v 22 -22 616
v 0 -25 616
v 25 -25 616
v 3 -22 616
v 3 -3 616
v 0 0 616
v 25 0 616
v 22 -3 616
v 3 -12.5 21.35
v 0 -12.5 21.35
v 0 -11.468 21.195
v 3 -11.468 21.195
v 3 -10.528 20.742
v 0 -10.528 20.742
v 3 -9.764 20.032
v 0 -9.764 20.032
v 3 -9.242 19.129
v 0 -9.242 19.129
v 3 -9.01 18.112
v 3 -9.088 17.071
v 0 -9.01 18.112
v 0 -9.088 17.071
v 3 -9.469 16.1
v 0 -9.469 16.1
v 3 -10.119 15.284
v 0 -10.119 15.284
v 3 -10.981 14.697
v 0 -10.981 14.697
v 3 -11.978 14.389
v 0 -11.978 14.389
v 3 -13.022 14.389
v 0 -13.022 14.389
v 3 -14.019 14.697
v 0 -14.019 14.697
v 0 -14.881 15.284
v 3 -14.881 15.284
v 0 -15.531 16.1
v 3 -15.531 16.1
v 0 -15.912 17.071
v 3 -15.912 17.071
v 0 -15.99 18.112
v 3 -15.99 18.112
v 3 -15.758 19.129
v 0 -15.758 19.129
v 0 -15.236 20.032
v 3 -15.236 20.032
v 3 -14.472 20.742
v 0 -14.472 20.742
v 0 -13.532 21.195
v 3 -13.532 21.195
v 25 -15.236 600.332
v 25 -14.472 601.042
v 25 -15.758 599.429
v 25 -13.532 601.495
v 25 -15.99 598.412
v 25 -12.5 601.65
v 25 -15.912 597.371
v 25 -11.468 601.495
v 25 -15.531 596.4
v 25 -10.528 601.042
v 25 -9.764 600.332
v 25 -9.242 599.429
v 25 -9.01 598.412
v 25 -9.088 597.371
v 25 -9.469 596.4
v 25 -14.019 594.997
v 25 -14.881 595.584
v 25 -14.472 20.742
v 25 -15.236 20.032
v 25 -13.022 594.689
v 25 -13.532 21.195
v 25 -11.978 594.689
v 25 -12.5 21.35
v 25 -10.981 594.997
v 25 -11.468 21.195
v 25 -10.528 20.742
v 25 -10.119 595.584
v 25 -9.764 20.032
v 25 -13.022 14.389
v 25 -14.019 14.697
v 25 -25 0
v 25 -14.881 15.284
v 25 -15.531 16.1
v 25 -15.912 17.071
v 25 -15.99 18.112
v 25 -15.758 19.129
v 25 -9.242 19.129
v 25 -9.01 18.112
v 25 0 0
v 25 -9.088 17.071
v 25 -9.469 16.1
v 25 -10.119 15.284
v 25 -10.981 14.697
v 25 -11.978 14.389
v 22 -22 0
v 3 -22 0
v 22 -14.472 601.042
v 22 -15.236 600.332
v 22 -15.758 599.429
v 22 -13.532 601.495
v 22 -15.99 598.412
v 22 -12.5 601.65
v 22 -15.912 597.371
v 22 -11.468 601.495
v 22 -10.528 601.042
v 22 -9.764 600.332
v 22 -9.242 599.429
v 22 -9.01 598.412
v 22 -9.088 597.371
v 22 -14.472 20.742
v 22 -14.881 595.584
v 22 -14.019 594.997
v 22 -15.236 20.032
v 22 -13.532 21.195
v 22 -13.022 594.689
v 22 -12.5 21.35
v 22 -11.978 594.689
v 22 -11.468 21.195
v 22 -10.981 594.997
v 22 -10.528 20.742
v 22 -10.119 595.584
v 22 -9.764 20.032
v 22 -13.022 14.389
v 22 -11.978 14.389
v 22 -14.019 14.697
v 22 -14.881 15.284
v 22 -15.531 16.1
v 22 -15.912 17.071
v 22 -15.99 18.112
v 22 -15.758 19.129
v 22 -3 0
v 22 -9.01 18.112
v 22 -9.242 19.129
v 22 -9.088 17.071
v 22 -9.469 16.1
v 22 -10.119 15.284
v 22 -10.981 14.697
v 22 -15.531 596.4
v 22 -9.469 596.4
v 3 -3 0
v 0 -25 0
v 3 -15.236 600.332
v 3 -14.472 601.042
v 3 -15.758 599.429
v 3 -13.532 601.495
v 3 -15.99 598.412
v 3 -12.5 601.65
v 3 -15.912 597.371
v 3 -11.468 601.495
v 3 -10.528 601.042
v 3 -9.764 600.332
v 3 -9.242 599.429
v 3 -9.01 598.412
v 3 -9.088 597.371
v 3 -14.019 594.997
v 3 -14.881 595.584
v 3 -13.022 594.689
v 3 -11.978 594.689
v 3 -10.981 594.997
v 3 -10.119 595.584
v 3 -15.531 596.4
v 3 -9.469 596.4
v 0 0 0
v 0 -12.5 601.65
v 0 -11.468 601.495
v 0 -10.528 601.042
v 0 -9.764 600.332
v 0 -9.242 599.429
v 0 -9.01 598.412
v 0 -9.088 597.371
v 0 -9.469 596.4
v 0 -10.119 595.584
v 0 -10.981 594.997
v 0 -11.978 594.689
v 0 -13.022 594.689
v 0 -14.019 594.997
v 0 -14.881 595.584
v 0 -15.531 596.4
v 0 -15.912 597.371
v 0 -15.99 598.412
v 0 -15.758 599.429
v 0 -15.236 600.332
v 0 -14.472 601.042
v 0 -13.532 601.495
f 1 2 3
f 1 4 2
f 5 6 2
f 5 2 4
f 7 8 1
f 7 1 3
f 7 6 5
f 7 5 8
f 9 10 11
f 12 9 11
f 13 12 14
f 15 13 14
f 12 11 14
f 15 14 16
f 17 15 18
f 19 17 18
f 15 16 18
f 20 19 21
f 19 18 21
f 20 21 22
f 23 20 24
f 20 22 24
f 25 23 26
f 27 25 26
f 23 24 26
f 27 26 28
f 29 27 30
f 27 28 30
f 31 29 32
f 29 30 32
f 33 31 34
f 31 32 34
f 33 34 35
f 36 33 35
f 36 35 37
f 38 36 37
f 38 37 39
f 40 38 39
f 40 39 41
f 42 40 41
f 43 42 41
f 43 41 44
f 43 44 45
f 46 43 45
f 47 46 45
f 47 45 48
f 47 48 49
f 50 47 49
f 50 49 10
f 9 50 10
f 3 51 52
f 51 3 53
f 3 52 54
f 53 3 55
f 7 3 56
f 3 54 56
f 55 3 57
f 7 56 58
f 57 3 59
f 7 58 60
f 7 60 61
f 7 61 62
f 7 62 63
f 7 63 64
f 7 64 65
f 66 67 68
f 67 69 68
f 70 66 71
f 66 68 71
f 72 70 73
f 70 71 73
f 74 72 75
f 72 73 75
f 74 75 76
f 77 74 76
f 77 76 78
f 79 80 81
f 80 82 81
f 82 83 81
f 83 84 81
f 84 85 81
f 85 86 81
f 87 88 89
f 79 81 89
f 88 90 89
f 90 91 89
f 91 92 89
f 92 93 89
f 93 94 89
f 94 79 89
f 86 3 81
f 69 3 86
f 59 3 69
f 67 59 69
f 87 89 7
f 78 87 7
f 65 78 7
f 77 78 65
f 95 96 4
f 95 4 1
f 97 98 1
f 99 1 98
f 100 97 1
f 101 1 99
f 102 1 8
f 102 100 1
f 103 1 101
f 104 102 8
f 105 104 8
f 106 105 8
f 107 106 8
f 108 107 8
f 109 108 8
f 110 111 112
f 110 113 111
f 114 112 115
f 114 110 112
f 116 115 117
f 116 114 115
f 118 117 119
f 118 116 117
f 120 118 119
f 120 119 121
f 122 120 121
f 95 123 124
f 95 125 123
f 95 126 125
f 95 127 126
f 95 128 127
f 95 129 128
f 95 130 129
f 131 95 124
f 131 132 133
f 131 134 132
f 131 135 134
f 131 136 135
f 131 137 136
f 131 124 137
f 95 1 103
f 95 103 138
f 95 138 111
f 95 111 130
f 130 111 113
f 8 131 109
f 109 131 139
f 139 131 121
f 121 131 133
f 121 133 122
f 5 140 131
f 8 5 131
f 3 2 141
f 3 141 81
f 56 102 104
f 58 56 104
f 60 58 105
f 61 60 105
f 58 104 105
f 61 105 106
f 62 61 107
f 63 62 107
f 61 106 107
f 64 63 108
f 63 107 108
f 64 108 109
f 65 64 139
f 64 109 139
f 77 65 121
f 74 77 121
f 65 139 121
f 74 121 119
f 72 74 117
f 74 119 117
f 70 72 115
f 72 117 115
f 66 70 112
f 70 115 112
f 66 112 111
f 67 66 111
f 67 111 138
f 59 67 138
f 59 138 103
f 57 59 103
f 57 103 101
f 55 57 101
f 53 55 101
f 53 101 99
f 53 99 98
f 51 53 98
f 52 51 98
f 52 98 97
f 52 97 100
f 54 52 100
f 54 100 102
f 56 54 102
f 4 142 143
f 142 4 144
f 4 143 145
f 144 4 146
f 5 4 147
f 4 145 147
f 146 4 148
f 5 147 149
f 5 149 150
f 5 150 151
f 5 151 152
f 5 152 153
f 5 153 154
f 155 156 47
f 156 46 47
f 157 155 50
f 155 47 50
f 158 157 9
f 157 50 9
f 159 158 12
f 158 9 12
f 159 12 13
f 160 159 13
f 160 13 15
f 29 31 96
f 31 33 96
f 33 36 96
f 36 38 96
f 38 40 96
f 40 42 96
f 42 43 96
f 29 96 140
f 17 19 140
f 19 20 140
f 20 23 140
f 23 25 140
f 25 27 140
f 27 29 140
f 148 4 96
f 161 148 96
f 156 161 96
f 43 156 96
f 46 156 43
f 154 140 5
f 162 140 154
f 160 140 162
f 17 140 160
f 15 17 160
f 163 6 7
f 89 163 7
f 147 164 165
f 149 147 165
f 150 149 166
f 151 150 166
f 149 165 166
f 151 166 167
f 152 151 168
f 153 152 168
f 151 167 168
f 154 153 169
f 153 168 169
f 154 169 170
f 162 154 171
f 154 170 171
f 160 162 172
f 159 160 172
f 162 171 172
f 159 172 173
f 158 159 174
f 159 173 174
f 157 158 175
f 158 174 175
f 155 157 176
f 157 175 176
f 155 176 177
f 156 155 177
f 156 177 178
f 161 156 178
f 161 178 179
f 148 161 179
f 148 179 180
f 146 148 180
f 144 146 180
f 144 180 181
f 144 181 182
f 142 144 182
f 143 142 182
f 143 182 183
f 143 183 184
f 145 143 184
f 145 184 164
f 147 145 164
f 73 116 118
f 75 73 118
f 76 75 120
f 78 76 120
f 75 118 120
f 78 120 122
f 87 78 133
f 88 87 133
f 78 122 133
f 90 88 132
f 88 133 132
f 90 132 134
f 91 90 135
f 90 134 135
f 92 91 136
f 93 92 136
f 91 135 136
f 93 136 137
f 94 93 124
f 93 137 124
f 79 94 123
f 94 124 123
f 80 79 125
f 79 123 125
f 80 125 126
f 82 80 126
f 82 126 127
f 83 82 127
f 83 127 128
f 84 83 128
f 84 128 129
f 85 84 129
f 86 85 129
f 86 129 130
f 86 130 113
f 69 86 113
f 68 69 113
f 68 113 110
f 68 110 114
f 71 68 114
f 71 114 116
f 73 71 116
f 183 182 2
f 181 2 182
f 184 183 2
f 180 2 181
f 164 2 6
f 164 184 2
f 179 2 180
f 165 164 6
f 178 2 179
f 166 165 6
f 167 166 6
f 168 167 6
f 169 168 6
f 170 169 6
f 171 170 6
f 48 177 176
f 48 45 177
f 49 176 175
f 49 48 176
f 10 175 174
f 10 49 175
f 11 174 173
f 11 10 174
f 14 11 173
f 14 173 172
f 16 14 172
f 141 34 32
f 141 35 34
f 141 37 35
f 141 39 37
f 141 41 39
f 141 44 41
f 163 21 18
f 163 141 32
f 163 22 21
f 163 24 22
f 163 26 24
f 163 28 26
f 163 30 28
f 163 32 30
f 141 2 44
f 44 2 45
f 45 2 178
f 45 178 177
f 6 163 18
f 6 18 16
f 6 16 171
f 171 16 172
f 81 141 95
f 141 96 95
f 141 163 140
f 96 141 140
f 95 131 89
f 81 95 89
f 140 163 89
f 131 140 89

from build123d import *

# Parameters (mm, degrees)
SKETCH_1_W             = 25
SKETCH_1_H             = 25
SKETCH_1_W_2           = 19
SKETCH_1_H_2           = 19
EXTRUDE_1_DEPTH        = 616
HOLE_WIZARD_7_0_7_1_D  = 7
PATTERN_LINEAR_1_COUNT = 2
PATTERN_LINEAR_1_PITCH = 580.3


with BuildPart() as part:
    # 草图1 → 拉伸1 (new body)
    with BuildSketch(Plane.XY):
        with Locations((12.5, -12.5)):
            Rectangle(SKETCH_1_W, SKETCH_1_H)
        with Locations((12.5, -12.5)):
            Rectangle(SKETCH_1_W_2, SKETCH_1_H_2, mode=Mode.SUBTRACT)
    extrude(amount=EXTRUDE_1_DEPTH)

    # Ø7.0 (7) 直径孔1 (through all)
    with Locations(Plane(origin=(25, 0, 0), x_dir=(0, 0, -1), z_dir=(1, 0, 0))):
        with Locations((-598.15, -12.5)):
            hole_wizard_7_0_7_1 = Hole(HOLE_WIZARD_7_0_7_1_D / 2)

    # 阵列(线性)1: Ø7.0 (7) 直径孔1 ×2
    with Locations(*[(0, 0, -i * PATTERN_LINEAR_1_PITCH) for i in range(1, PATTERN_LINEAR_1_COUNT)]):
        add(hole_wizard_7_0_7_1, mode=Mode.SUBTRACT)


solid = part.part
